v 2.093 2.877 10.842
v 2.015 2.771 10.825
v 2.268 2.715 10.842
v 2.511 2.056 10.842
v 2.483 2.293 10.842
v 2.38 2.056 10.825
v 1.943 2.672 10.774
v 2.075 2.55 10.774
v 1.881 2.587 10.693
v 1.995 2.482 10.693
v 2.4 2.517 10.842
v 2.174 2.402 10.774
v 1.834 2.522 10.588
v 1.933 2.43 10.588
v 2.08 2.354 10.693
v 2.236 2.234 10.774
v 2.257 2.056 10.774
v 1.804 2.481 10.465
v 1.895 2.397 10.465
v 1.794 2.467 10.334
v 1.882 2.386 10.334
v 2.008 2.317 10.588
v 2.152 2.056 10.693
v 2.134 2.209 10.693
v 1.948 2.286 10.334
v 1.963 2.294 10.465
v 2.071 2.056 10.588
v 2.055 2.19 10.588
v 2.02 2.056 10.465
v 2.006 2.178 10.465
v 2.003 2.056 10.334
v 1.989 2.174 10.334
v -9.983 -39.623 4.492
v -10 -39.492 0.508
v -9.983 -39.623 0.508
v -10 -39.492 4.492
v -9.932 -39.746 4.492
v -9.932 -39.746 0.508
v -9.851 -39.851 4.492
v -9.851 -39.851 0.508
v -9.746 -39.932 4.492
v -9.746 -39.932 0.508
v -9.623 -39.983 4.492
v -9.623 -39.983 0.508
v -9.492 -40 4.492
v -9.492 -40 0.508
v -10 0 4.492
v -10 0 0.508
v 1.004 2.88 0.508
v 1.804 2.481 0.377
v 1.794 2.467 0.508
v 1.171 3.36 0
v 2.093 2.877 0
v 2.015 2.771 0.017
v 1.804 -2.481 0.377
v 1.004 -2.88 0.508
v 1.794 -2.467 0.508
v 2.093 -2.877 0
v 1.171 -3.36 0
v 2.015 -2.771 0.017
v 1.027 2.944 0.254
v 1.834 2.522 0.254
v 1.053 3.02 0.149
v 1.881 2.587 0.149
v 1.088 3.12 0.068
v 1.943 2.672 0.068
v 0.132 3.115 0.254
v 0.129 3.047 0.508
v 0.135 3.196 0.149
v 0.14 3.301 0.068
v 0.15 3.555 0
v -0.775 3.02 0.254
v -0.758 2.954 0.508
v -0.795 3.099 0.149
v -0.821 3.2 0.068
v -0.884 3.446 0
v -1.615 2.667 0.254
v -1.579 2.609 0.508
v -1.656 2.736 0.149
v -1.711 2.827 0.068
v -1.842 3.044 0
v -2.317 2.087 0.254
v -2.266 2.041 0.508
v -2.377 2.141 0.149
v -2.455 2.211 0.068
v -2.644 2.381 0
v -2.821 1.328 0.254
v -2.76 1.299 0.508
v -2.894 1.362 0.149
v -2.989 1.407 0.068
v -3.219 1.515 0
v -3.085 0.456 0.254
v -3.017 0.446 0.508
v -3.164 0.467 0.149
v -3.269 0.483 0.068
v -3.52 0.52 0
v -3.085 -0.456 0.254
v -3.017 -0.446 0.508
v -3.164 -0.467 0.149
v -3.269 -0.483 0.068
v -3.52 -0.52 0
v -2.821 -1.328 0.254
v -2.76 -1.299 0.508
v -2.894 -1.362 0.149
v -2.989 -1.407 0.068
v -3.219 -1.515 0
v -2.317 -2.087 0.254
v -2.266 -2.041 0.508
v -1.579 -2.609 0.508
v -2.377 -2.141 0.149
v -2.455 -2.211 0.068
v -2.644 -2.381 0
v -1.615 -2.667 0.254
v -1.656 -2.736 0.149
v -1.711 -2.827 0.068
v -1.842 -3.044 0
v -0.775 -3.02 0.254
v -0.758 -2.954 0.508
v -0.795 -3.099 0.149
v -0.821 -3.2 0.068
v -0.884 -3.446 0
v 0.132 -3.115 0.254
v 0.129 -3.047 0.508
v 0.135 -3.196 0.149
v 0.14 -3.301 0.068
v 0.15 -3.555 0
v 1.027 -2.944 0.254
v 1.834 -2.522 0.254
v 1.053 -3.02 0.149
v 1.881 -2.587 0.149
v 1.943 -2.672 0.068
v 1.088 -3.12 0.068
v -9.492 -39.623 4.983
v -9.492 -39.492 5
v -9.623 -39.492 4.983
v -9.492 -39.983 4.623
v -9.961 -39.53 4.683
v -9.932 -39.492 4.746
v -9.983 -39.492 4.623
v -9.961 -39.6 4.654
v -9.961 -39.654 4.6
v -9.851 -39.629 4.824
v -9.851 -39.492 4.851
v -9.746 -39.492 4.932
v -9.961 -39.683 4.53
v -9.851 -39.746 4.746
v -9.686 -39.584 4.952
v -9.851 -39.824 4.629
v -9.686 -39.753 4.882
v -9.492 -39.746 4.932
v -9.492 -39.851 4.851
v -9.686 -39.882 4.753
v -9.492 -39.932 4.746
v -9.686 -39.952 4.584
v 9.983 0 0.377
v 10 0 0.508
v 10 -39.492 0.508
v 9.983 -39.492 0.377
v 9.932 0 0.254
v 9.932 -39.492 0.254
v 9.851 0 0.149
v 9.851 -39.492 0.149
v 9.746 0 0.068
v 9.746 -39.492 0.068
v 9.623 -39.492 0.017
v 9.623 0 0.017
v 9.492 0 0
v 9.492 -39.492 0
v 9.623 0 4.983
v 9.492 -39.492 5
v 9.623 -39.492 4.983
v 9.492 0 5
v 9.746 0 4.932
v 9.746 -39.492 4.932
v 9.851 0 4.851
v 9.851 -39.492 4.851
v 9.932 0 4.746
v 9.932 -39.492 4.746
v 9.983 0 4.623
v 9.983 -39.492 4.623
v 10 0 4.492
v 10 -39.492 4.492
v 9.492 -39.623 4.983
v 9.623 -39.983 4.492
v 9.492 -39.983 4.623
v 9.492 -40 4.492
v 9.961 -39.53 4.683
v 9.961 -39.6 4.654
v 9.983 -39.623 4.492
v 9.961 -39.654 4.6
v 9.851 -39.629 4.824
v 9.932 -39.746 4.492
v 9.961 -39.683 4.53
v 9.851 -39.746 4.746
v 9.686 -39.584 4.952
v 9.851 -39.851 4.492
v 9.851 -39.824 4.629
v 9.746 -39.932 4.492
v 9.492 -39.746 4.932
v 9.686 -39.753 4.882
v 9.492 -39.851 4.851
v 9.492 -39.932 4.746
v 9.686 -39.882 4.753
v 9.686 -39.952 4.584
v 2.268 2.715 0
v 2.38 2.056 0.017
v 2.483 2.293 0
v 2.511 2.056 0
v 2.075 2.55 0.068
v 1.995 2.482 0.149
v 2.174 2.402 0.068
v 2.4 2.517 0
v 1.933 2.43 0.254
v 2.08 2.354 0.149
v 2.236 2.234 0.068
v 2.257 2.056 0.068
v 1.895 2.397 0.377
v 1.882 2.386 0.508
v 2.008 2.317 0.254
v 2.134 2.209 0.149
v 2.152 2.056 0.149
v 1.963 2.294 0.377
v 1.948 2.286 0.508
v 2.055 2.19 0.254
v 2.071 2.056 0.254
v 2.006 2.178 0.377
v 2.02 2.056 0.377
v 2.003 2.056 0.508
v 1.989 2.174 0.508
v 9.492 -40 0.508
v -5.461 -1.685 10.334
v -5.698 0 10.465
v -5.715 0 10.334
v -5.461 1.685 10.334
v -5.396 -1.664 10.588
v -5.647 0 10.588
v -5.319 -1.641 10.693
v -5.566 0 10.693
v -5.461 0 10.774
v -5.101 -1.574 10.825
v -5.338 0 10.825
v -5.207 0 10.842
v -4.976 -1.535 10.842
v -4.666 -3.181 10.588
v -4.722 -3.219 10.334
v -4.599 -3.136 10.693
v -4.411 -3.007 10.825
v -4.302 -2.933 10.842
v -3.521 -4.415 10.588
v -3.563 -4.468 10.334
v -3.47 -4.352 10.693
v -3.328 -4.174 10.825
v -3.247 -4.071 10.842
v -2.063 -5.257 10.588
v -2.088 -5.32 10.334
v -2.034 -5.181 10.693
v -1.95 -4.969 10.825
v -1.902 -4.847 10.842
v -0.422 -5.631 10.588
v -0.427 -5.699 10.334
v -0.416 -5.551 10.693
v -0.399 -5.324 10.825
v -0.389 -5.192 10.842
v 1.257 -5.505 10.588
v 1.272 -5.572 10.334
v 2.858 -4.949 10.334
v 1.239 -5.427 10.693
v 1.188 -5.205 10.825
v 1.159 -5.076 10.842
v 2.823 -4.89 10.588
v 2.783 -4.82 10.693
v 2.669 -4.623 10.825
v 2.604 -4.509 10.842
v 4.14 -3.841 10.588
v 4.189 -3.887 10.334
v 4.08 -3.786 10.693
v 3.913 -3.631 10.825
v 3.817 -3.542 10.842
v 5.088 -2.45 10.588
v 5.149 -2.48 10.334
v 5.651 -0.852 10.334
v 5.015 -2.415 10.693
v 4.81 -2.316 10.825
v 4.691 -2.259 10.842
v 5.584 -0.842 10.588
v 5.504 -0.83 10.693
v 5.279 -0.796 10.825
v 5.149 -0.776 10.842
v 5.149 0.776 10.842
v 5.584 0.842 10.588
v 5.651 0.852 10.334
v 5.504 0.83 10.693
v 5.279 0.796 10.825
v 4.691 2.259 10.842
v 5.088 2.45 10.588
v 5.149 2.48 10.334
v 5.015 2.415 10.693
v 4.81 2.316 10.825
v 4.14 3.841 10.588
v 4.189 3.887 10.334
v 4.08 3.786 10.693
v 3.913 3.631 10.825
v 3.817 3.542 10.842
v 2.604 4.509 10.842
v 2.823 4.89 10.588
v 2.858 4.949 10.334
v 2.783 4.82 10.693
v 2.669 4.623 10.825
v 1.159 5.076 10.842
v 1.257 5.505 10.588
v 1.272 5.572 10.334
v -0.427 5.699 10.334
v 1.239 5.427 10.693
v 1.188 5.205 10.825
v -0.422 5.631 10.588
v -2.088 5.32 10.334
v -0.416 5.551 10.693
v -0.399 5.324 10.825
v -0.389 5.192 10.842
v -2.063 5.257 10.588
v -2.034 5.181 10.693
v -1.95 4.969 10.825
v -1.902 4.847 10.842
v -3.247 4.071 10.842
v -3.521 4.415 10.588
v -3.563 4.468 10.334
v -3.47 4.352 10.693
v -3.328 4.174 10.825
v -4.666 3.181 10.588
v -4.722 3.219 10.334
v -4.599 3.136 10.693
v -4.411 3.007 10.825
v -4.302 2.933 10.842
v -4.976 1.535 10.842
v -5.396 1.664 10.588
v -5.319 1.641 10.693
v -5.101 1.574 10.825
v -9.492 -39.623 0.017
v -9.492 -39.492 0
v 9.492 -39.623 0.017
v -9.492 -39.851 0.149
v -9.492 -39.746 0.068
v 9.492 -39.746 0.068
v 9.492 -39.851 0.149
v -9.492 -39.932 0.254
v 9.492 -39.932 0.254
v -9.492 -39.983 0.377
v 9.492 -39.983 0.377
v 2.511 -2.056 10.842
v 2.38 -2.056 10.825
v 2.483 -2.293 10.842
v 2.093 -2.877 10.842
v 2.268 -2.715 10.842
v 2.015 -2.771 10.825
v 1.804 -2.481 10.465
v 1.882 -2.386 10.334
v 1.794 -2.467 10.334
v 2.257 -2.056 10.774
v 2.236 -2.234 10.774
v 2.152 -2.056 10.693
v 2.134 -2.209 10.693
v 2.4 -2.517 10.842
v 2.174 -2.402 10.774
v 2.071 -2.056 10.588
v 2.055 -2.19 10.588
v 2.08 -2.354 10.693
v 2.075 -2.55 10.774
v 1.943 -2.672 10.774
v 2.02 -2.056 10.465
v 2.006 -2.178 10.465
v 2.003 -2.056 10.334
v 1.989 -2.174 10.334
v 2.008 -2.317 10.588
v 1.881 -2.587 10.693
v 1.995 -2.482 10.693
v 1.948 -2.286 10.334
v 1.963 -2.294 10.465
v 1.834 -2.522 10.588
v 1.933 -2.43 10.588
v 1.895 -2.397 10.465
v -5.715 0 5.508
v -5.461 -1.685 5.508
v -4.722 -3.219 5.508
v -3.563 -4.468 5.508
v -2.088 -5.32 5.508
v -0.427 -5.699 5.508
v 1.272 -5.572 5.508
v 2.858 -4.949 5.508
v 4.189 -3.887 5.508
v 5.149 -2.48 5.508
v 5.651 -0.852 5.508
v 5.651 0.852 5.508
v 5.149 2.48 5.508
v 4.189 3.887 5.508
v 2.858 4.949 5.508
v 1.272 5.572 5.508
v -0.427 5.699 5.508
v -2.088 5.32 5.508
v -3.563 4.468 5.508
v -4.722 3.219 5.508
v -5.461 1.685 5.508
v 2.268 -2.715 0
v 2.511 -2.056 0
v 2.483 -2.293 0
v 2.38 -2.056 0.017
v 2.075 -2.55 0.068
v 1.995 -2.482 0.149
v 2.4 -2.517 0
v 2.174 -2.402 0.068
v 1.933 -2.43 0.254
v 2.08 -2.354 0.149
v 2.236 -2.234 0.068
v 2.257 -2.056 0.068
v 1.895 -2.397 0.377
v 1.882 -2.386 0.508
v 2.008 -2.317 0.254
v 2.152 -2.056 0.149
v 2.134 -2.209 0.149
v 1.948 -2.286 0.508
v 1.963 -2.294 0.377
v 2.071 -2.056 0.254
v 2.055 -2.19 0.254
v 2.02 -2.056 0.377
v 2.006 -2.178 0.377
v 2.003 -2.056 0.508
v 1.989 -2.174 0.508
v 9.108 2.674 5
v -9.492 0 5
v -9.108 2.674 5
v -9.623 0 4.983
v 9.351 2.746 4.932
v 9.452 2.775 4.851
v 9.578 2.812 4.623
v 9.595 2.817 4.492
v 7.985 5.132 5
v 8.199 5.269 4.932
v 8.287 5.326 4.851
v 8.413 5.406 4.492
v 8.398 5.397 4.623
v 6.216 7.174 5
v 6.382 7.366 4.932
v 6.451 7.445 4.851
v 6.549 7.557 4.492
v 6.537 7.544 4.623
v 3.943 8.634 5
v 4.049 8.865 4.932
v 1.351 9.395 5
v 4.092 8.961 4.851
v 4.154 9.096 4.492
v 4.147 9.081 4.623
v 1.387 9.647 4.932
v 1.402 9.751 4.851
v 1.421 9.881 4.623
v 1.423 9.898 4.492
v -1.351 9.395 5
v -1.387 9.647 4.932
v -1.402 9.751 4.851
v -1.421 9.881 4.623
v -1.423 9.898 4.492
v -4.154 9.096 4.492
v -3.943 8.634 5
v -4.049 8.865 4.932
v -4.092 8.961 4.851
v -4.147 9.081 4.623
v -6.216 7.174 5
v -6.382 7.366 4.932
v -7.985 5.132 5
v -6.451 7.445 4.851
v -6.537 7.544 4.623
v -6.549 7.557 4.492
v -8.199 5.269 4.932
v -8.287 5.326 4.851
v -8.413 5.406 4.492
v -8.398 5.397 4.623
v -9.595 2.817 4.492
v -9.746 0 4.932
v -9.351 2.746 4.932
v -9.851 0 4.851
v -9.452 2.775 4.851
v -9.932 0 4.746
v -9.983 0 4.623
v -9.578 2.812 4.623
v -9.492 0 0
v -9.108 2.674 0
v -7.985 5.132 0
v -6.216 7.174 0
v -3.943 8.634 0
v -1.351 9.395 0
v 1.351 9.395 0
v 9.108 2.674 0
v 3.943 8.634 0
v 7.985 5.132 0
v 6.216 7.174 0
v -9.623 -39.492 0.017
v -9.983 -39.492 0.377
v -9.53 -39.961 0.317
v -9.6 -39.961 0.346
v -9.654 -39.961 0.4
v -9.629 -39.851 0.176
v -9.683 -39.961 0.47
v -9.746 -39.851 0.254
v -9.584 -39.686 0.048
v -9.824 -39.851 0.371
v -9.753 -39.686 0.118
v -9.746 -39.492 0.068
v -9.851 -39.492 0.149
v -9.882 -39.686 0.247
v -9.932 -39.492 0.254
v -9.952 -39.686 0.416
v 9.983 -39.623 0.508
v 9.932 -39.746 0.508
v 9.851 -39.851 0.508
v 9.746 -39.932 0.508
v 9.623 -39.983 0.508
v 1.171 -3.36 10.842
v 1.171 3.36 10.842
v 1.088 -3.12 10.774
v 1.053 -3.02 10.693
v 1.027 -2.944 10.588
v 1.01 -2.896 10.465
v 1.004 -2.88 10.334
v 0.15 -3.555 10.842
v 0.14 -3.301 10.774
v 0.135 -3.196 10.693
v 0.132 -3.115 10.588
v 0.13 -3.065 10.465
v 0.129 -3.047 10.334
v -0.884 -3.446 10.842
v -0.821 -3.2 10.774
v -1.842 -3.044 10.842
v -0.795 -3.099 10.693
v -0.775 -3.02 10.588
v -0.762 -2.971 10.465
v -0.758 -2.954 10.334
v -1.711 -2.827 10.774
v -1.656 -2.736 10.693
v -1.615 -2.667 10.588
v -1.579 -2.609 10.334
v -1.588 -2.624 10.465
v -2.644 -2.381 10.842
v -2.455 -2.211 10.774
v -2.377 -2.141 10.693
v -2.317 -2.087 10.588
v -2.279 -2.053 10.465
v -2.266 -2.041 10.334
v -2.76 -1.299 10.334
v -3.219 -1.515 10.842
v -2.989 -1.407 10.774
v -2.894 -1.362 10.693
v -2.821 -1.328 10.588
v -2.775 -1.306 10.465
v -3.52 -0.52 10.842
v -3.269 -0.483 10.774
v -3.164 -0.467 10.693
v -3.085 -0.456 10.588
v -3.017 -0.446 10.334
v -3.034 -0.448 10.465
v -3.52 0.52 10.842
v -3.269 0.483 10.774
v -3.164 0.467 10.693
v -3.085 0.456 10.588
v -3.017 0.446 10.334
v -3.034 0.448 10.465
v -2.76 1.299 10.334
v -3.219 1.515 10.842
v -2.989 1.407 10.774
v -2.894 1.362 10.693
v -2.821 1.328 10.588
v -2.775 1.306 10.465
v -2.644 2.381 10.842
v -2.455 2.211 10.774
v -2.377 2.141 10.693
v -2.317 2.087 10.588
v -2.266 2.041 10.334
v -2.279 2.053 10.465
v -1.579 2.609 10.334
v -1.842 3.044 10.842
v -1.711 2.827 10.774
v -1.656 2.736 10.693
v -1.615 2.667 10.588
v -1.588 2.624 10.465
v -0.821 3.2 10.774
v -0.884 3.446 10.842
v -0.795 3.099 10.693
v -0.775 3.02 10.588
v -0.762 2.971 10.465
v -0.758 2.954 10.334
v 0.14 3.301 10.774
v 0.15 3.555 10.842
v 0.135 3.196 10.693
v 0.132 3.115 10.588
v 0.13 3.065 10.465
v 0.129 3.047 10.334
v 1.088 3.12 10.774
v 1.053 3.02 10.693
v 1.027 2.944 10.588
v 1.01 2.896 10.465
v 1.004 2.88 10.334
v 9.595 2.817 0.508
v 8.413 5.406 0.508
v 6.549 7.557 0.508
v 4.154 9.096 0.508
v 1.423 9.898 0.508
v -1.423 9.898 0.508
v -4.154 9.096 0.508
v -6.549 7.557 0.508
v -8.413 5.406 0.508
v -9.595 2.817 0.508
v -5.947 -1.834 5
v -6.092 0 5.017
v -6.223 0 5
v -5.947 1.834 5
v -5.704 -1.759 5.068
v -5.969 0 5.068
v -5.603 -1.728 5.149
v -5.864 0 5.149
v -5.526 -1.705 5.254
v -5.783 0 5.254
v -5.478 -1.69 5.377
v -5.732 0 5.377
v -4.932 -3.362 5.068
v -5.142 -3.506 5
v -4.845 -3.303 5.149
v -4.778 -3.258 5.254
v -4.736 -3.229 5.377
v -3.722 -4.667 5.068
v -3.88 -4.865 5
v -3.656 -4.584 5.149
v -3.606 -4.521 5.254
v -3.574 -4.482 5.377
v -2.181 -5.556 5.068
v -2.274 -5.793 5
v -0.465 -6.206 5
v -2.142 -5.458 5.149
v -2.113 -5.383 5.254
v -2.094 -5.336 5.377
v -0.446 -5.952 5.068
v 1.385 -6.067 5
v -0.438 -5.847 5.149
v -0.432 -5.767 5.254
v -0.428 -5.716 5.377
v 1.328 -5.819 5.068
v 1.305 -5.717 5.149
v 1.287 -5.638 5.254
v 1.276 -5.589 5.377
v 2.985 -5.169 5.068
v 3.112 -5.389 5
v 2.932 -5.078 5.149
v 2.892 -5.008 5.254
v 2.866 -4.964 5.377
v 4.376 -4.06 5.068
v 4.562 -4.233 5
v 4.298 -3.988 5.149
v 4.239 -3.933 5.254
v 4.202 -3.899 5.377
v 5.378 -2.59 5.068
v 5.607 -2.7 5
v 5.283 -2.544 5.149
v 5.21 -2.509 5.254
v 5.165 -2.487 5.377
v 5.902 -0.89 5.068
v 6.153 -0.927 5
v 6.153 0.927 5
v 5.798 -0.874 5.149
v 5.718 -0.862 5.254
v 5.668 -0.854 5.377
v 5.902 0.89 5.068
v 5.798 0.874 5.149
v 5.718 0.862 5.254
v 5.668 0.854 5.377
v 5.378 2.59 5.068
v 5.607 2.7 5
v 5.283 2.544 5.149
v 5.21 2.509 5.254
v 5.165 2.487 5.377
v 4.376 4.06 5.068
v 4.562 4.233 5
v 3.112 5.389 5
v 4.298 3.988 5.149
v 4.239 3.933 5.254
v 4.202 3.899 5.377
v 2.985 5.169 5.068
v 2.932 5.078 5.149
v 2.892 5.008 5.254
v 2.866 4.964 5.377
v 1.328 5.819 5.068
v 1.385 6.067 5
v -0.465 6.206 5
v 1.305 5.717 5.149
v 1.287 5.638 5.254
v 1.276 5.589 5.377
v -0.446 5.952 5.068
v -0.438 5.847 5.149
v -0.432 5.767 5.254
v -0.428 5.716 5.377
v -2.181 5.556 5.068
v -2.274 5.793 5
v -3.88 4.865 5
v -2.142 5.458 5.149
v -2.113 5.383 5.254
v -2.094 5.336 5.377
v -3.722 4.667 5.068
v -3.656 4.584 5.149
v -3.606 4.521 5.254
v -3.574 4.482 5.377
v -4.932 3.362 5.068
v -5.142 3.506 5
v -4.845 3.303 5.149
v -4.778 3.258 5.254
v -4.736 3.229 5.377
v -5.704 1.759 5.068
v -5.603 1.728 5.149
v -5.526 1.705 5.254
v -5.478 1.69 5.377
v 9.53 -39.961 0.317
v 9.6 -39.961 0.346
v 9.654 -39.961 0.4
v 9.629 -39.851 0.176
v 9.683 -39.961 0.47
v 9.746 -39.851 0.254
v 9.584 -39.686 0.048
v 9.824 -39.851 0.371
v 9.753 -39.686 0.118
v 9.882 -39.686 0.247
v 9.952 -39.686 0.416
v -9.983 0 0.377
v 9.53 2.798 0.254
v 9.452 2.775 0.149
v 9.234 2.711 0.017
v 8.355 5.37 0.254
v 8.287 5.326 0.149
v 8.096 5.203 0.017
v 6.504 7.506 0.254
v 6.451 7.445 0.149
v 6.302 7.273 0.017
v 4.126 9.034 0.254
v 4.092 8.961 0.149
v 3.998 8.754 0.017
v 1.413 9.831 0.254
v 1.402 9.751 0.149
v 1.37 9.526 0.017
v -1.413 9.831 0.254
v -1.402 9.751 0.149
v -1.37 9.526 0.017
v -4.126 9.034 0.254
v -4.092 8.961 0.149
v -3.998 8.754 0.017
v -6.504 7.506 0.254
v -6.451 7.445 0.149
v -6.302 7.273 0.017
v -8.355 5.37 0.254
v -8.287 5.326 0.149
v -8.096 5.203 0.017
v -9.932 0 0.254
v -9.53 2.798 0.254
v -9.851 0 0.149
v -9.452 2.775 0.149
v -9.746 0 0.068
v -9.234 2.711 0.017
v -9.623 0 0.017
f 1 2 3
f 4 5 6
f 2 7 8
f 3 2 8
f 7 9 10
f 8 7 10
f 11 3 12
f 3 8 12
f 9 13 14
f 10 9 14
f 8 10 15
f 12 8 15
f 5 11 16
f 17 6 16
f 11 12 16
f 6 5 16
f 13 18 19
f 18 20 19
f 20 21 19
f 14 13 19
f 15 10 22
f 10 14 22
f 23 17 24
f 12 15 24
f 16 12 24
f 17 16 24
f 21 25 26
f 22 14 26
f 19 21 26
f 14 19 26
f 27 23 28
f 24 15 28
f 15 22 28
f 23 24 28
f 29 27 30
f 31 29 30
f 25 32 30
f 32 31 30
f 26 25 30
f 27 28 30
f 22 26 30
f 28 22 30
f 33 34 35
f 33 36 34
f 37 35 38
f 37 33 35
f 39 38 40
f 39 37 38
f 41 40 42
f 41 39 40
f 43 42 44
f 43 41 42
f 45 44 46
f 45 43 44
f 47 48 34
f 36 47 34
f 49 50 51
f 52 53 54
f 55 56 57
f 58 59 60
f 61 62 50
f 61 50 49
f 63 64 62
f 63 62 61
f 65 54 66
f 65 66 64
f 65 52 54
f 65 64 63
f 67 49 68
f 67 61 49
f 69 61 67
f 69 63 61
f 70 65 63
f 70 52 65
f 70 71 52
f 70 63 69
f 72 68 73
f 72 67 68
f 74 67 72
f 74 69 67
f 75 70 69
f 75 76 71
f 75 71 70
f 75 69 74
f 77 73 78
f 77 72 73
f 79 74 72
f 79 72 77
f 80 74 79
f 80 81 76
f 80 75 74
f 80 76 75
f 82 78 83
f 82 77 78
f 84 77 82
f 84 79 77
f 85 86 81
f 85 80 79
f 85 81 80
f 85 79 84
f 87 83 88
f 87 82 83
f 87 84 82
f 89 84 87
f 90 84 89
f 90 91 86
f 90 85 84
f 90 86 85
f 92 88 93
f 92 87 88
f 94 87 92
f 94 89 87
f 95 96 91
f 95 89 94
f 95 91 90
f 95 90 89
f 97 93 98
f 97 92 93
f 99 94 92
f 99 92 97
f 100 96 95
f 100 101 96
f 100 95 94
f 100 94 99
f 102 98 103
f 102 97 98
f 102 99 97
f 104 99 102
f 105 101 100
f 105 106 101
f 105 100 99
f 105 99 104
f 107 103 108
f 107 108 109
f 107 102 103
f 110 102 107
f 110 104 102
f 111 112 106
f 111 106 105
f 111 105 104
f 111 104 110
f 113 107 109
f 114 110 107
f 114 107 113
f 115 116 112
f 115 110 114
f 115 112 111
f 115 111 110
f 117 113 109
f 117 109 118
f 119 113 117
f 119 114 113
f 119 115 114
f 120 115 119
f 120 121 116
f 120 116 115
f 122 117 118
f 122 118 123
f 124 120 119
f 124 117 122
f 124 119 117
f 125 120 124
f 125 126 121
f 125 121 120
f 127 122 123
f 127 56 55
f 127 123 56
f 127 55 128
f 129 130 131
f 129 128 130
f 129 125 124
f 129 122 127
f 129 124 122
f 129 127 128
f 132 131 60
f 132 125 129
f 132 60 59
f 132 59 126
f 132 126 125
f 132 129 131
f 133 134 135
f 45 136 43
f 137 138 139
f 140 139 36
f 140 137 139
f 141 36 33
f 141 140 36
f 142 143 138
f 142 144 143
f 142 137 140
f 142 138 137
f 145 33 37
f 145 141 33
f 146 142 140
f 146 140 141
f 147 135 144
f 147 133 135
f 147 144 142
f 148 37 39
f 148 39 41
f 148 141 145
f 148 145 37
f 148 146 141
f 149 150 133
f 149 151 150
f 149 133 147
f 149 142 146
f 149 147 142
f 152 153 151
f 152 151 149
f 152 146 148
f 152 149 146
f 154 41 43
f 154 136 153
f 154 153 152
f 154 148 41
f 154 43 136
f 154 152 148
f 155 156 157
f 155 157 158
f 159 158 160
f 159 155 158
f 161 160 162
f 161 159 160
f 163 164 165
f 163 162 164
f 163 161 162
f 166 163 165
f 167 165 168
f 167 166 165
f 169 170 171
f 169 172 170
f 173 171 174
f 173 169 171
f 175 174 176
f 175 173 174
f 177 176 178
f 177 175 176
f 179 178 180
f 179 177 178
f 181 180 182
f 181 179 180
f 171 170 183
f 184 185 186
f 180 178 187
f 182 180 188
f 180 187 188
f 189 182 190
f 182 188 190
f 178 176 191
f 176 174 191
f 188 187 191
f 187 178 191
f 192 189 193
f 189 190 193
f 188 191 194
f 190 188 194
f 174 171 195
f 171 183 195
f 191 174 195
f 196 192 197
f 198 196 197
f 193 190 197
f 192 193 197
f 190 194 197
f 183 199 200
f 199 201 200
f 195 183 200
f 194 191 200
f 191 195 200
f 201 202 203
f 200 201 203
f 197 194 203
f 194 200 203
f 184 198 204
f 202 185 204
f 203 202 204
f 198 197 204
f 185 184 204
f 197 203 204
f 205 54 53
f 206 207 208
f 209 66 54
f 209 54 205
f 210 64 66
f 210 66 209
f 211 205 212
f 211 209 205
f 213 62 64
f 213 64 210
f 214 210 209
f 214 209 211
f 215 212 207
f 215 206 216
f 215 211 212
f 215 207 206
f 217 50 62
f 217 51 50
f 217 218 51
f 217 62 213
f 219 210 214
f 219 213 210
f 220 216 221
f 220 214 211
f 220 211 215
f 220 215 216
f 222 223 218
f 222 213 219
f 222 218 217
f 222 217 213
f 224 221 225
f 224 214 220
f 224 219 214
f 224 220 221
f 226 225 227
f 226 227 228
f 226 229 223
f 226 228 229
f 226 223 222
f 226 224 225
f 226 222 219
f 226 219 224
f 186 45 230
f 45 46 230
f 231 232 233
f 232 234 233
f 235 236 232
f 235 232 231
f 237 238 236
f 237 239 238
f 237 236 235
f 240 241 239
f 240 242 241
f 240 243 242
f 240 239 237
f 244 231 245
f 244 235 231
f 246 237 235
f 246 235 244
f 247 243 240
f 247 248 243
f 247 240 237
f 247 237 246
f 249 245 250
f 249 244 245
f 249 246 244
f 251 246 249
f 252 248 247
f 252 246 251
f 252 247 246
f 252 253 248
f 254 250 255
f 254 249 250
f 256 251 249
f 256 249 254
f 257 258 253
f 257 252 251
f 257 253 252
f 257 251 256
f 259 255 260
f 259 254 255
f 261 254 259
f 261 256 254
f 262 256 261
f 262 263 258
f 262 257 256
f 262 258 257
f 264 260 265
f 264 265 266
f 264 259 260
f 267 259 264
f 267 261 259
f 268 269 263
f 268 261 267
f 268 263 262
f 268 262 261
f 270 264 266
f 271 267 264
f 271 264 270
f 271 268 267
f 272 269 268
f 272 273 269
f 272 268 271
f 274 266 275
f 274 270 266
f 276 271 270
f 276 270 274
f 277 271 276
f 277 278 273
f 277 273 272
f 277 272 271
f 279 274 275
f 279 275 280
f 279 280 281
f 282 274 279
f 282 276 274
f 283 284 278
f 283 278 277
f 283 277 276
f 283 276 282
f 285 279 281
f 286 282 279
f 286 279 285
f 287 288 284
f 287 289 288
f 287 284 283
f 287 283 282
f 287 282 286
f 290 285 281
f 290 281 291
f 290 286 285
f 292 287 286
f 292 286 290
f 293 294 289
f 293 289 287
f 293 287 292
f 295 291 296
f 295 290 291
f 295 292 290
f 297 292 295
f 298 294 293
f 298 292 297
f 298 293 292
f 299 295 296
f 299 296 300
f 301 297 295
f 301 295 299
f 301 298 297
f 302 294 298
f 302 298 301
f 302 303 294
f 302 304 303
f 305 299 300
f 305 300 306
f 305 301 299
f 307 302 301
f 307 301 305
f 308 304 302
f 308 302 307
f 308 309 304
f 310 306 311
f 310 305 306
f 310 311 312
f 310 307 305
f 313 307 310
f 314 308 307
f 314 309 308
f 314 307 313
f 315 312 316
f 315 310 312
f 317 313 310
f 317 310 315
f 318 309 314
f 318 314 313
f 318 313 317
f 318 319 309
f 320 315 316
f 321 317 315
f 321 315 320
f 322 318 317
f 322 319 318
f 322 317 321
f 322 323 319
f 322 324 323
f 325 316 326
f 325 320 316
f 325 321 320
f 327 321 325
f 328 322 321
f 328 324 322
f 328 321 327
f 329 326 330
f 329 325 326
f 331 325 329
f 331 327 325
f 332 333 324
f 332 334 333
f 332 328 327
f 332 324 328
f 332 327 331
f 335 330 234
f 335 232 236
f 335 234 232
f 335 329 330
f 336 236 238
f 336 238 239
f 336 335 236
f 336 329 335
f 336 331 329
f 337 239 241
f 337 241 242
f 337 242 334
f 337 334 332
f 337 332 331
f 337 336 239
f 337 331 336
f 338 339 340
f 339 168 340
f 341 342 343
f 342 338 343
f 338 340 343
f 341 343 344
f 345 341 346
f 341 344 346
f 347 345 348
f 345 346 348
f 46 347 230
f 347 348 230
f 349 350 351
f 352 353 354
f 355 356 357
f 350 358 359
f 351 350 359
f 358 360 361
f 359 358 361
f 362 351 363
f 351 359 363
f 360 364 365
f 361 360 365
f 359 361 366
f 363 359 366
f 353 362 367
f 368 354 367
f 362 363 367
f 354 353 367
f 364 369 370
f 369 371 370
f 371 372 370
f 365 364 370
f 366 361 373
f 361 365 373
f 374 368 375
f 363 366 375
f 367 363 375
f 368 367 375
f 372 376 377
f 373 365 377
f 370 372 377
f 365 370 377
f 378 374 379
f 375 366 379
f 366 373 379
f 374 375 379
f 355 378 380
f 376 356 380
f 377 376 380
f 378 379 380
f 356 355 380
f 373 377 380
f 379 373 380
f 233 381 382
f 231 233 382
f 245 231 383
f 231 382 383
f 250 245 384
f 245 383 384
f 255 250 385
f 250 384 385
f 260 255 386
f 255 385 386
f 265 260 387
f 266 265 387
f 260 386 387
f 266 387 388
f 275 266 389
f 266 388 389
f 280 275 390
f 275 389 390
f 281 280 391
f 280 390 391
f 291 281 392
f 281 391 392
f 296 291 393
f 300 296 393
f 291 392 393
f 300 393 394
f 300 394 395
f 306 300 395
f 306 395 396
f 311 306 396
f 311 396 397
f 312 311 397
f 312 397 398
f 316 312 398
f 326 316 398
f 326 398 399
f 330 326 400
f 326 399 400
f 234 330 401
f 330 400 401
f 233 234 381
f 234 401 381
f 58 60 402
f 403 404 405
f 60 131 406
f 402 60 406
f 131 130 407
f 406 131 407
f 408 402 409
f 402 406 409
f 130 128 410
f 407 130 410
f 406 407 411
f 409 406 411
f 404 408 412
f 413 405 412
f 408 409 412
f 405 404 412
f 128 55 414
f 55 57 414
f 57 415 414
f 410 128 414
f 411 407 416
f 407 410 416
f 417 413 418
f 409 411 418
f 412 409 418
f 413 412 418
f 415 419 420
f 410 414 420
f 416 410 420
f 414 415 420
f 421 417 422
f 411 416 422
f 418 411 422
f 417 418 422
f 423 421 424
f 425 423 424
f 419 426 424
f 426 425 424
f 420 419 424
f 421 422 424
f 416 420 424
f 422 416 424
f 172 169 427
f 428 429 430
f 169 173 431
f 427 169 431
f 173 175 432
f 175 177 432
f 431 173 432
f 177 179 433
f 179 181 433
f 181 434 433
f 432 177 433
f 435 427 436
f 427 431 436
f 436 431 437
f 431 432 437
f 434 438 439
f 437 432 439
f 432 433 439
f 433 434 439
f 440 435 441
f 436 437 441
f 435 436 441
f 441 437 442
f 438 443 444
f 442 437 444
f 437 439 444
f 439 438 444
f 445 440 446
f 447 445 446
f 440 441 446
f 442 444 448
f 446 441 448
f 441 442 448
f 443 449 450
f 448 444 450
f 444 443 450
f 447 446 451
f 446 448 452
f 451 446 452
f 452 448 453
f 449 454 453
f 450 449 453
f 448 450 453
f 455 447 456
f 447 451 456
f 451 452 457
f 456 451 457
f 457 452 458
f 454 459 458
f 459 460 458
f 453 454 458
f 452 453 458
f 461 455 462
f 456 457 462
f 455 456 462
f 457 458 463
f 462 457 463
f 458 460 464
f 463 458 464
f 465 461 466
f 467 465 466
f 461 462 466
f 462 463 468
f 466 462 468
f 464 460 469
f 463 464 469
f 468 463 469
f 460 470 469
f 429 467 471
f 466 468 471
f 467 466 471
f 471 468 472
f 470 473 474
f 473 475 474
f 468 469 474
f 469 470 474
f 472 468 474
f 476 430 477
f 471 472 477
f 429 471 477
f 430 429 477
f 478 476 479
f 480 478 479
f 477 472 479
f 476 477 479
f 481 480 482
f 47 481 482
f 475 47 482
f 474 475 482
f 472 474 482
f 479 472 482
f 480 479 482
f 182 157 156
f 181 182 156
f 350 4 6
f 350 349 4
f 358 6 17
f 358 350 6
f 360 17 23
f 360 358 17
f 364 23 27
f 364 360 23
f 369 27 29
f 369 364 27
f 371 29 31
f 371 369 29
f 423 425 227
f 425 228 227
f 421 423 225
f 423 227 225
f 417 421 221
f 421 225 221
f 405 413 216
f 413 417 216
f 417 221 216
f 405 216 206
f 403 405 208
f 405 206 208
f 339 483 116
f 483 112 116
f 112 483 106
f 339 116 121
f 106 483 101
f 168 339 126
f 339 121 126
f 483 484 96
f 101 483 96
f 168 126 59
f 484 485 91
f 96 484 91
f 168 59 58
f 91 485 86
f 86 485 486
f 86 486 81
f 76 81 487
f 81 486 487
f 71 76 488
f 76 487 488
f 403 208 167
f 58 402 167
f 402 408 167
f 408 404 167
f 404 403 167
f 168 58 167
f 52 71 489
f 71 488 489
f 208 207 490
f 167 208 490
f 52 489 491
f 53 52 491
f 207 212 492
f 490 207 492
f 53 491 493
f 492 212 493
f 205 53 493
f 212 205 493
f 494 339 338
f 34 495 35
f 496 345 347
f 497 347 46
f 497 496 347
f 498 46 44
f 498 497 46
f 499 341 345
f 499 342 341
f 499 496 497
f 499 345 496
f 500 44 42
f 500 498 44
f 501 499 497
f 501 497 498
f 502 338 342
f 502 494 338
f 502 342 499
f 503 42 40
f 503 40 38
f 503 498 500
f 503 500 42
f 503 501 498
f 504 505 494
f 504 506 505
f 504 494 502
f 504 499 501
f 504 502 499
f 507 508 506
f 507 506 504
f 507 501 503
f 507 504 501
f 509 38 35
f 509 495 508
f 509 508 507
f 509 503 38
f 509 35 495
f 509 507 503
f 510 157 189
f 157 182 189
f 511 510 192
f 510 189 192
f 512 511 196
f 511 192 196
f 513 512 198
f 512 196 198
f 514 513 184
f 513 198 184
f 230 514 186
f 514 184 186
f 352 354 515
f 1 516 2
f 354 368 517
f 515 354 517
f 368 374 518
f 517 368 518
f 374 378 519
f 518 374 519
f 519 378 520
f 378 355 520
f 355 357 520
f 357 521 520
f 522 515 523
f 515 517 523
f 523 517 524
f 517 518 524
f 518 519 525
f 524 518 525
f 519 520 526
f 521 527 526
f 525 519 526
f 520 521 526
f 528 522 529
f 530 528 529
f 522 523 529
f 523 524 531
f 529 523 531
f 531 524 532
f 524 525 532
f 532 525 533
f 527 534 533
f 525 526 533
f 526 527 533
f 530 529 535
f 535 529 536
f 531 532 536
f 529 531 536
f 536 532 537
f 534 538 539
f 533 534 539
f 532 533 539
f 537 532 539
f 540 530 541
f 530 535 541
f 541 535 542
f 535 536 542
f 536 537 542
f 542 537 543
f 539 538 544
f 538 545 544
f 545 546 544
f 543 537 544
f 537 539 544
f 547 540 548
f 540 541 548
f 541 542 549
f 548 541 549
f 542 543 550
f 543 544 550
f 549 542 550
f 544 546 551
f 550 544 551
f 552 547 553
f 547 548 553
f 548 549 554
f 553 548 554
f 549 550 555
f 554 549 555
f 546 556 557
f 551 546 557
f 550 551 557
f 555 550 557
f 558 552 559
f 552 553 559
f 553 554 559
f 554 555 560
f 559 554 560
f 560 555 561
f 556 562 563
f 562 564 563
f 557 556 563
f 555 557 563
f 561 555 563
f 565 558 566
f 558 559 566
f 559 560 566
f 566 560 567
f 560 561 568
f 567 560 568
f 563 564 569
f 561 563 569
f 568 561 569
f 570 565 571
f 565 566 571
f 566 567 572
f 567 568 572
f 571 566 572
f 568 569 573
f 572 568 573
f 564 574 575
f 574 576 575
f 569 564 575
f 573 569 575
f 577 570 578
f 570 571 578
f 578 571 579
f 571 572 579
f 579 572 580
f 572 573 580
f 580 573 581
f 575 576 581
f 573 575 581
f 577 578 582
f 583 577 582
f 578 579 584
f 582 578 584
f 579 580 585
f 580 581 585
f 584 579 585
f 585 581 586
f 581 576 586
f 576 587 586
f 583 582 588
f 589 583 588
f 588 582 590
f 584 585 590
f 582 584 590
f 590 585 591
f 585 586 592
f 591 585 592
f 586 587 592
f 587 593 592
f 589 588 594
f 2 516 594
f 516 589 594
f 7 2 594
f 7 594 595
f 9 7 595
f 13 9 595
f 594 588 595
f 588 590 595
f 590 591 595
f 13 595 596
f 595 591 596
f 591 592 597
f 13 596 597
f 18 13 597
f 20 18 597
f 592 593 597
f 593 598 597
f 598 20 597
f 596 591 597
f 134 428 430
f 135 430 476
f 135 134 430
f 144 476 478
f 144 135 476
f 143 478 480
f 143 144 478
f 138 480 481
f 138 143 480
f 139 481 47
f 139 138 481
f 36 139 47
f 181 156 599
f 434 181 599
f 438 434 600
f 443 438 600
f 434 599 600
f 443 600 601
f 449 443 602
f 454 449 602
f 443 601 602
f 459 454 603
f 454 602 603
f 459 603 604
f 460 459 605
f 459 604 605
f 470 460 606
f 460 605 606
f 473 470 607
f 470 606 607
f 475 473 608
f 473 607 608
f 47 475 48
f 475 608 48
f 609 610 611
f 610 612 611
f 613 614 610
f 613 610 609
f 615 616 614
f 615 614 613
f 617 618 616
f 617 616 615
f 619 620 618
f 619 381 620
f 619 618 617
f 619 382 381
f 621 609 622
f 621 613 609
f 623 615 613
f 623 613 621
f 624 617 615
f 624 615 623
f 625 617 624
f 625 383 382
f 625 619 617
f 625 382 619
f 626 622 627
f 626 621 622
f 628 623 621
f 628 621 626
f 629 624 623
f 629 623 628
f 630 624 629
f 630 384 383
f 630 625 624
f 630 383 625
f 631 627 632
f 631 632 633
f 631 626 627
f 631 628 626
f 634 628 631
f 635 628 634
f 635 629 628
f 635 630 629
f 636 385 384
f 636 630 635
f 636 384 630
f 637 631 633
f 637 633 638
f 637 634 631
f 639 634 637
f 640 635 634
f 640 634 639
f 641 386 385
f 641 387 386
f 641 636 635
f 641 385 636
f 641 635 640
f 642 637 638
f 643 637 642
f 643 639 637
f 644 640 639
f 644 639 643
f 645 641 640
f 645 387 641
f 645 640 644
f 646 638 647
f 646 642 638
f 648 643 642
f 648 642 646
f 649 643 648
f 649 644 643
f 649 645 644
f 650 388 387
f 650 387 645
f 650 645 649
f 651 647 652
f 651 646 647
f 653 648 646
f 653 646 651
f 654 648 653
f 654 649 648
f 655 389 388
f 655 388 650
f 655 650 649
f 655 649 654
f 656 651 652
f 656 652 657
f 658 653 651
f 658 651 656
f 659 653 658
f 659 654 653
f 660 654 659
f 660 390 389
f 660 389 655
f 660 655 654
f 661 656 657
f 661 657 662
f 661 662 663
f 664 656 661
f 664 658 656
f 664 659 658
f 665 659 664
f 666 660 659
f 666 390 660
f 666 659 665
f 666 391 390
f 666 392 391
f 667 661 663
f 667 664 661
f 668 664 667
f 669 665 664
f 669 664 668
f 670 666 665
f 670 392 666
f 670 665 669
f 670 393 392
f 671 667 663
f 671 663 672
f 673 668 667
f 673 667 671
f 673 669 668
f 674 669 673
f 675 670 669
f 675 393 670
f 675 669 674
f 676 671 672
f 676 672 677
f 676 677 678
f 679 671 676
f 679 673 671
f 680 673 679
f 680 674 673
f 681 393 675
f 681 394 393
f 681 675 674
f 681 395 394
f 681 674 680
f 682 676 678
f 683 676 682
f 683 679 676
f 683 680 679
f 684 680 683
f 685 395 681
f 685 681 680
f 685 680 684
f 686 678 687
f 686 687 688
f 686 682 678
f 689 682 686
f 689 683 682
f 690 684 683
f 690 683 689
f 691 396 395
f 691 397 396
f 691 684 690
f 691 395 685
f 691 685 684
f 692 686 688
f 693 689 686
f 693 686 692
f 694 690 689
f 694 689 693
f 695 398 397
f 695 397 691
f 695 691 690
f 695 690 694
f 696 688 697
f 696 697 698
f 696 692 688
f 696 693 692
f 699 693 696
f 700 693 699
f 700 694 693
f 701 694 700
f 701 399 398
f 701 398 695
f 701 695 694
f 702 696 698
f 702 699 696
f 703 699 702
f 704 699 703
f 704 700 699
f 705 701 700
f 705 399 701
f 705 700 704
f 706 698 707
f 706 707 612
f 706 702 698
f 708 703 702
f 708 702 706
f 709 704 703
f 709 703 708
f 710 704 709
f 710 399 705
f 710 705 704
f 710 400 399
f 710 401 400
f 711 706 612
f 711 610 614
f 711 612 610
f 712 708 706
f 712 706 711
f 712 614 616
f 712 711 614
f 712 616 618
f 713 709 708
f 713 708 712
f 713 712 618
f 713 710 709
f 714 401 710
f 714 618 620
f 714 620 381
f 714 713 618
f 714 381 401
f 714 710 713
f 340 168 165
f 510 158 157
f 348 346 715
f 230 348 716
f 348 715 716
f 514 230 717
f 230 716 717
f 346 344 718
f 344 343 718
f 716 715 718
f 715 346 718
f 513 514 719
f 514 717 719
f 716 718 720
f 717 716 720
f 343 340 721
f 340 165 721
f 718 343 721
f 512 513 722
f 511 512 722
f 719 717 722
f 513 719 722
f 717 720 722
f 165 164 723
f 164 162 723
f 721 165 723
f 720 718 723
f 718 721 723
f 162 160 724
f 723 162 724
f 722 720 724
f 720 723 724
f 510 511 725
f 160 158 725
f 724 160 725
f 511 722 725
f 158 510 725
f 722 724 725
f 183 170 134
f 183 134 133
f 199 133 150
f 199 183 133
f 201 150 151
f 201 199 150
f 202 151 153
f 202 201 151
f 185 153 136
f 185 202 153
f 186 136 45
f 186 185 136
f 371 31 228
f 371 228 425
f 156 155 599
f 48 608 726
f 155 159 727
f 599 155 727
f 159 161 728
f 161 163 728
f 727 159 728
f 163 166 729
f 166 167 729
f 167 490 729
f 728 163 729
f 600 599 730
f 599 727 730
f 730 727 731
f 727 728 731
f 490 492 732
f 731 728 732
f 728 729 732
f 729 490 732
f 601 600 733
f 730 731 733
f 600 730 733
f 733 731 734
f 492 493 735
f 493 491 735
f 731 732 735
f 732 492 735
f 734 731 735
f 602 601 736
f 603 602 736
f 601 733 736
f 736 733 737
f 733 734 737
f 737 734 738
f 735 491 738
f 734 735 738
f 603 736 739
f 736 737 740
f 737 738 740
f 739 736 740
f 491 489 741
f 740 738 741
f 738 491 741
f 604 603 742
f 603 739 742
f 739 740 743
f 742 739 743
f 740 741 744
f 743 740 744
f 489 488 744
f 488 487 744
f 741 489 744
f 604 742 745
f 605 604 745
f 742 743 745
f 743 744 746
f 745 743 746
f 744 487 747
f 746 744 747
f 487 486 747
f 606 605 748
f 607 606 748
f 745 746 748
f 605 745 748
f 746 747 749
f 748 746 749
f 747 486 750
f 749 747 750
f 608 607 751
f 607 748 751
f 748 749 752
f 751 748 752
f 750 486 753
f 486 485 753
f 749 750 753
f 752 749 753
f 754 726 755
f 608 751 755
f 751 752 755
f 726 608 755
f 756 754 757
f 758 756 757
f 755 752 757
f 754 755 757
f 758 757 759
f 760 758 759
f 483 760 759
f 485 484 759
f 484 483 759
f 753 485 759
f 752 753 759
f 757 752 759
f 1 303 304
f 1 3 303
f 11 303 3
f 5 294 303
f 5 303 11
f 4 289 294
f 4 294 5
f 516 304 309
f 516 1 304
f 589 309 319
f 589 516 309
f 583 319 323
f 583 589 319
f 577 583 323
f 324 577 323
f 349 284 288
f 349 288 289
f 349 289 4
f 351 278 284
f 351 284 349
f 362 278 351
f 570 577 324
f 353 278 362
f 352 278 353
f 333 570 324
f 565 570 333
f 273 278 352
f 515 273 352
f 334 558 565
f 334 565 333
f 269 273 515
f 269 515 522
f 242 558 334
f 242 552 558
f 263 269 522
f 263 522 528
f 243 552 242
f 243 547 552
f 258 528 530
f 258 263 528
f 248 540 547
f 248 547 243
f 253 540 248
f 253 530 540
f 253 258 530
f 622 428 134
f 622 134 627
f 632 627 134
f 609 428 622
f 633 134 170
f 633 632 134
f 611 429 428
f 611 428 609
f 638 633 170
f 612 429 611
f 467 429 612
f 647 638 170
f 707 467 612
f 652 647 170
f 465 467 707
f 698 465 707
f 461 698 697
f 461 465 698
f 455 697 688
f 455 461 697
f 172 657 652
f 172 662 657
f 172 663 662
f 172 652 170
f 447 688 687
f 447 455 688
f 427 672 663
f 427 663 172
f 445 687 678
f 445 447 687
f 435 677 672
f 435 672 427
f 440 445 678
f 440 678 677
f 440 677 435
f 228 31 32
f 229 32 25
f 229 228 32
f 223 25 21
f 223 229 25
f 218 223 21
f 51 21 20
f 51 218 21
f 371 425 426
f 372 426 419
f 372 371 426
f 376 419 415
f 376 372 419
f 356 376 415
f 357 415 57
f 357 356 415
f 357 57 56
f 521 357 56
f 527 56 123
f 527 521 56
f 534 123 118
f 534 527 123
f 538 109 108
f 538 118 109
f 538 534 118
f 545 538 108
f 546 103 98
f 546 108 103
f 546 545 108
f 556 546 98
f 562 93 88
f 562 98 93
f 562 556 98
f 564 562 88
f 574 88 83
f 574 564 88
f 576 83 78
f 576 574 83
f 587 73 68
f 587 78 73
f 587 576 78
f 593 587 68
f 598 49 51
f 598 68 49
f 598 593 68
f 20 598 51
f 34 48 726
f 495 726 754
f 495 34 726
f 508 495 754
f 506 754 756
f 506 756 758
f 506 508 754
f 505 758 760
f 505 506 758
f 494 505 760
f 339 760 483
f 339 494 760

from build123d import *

# Parameters (mm, degrees)
BOSS_EXTRUDE1_DEPTH = 5
SKETCH2_R           = 5.715
BOSS_EXTRUDE2_DEPTH = 5.842
CUT_EXTRUDE1_REACH  = 43.643
FILLET1_R           = 0.508


with BuildPart() as part:
    # Sketch1 → Boss-Extrude1 (new body)
    with BuildSketch(Plane.XY):
        with BuildLine():
            Line((-10, 0), (-10, -40))
            Line((-10, -40), (10, -40))
            Line((10, -40), (10, 0))
            ThreePointArc((10, 0), (0, 10), (-10, 0))
        make_face()
    extrude(amount=BOSS_EXTRUDE1_DEPTH)

    # Sketch2 → Boss-Extrude2 (add)
    with BuildSketch(Plane.XY.offset(5)):
        with Locations(Location((0, 0, 0), (0, 0, 180))):
            Circle(SKETCH2_R)
        with BuildLine():
            Line((2.003122562, 2.3), (2.003122562, -2.3))
            ThreePointArc((2.003122562, -2.3), (-3.05, 0), (2.003122562, 2.3))
        make_face(mode=Mode.SUBTRACT)
    extrude(amount=BOSS_EXTRUDE2_DEPTH)

    # Sketch3 → Cut-Extrude1 (cut, up to next)
    with BuildSketch(Plane.XY.offset(5), mode=Mode.PRIVATE) as cut_extrude1_sk1:
        with BuildLine():
            Line((2.003122562, 2.3), (2.003122562, -2.3))
            ThreePointArc((2.003122562, -2.3), (-3.05, 0), (2.003122562, 2.3))
        make_face()
    cut_extrude1_tool1 = extrude(cut_extrude1_sk1.sketch, amount=-CUT_EXTRUDE1_REACH, mode=Mode.PRIVATE) & part.part
    add(cut_extrude1_tool1.solids().sort_by_distance((-0.313362, 0, 5))[0], mode=Mode.SUBTRACT)

    # Fillet1
    fillet1_edges = [part.edges().sort_by_distance(p)[0] for p in [
        (0, -40, 5),
        (5.715, 0, 5),
        (5.715, 0, 10.842),
        (10, -20, 5),
        (-3.05, 0, 10.842),
        (2.003122562, -2.3, 5.421),
        (2.003122562, 0, 10.842),
        (2.003122562, 2.3, 5.421),
        (-3.05, 0, 0),
        (2.003122562, 0, 0),
        (0, 10, 5),
        (10, -20, 0),
        (0, -40, 0),
        (-10, -20, 0),
        (0, 10, 0),
        (10, -40, 2.5),
        (-10, -40, 2.5),
        (-10, -20, 5),
    ]]
    fillet(fillet1_edges, radius=FILLET1_R)


solid = part.part
